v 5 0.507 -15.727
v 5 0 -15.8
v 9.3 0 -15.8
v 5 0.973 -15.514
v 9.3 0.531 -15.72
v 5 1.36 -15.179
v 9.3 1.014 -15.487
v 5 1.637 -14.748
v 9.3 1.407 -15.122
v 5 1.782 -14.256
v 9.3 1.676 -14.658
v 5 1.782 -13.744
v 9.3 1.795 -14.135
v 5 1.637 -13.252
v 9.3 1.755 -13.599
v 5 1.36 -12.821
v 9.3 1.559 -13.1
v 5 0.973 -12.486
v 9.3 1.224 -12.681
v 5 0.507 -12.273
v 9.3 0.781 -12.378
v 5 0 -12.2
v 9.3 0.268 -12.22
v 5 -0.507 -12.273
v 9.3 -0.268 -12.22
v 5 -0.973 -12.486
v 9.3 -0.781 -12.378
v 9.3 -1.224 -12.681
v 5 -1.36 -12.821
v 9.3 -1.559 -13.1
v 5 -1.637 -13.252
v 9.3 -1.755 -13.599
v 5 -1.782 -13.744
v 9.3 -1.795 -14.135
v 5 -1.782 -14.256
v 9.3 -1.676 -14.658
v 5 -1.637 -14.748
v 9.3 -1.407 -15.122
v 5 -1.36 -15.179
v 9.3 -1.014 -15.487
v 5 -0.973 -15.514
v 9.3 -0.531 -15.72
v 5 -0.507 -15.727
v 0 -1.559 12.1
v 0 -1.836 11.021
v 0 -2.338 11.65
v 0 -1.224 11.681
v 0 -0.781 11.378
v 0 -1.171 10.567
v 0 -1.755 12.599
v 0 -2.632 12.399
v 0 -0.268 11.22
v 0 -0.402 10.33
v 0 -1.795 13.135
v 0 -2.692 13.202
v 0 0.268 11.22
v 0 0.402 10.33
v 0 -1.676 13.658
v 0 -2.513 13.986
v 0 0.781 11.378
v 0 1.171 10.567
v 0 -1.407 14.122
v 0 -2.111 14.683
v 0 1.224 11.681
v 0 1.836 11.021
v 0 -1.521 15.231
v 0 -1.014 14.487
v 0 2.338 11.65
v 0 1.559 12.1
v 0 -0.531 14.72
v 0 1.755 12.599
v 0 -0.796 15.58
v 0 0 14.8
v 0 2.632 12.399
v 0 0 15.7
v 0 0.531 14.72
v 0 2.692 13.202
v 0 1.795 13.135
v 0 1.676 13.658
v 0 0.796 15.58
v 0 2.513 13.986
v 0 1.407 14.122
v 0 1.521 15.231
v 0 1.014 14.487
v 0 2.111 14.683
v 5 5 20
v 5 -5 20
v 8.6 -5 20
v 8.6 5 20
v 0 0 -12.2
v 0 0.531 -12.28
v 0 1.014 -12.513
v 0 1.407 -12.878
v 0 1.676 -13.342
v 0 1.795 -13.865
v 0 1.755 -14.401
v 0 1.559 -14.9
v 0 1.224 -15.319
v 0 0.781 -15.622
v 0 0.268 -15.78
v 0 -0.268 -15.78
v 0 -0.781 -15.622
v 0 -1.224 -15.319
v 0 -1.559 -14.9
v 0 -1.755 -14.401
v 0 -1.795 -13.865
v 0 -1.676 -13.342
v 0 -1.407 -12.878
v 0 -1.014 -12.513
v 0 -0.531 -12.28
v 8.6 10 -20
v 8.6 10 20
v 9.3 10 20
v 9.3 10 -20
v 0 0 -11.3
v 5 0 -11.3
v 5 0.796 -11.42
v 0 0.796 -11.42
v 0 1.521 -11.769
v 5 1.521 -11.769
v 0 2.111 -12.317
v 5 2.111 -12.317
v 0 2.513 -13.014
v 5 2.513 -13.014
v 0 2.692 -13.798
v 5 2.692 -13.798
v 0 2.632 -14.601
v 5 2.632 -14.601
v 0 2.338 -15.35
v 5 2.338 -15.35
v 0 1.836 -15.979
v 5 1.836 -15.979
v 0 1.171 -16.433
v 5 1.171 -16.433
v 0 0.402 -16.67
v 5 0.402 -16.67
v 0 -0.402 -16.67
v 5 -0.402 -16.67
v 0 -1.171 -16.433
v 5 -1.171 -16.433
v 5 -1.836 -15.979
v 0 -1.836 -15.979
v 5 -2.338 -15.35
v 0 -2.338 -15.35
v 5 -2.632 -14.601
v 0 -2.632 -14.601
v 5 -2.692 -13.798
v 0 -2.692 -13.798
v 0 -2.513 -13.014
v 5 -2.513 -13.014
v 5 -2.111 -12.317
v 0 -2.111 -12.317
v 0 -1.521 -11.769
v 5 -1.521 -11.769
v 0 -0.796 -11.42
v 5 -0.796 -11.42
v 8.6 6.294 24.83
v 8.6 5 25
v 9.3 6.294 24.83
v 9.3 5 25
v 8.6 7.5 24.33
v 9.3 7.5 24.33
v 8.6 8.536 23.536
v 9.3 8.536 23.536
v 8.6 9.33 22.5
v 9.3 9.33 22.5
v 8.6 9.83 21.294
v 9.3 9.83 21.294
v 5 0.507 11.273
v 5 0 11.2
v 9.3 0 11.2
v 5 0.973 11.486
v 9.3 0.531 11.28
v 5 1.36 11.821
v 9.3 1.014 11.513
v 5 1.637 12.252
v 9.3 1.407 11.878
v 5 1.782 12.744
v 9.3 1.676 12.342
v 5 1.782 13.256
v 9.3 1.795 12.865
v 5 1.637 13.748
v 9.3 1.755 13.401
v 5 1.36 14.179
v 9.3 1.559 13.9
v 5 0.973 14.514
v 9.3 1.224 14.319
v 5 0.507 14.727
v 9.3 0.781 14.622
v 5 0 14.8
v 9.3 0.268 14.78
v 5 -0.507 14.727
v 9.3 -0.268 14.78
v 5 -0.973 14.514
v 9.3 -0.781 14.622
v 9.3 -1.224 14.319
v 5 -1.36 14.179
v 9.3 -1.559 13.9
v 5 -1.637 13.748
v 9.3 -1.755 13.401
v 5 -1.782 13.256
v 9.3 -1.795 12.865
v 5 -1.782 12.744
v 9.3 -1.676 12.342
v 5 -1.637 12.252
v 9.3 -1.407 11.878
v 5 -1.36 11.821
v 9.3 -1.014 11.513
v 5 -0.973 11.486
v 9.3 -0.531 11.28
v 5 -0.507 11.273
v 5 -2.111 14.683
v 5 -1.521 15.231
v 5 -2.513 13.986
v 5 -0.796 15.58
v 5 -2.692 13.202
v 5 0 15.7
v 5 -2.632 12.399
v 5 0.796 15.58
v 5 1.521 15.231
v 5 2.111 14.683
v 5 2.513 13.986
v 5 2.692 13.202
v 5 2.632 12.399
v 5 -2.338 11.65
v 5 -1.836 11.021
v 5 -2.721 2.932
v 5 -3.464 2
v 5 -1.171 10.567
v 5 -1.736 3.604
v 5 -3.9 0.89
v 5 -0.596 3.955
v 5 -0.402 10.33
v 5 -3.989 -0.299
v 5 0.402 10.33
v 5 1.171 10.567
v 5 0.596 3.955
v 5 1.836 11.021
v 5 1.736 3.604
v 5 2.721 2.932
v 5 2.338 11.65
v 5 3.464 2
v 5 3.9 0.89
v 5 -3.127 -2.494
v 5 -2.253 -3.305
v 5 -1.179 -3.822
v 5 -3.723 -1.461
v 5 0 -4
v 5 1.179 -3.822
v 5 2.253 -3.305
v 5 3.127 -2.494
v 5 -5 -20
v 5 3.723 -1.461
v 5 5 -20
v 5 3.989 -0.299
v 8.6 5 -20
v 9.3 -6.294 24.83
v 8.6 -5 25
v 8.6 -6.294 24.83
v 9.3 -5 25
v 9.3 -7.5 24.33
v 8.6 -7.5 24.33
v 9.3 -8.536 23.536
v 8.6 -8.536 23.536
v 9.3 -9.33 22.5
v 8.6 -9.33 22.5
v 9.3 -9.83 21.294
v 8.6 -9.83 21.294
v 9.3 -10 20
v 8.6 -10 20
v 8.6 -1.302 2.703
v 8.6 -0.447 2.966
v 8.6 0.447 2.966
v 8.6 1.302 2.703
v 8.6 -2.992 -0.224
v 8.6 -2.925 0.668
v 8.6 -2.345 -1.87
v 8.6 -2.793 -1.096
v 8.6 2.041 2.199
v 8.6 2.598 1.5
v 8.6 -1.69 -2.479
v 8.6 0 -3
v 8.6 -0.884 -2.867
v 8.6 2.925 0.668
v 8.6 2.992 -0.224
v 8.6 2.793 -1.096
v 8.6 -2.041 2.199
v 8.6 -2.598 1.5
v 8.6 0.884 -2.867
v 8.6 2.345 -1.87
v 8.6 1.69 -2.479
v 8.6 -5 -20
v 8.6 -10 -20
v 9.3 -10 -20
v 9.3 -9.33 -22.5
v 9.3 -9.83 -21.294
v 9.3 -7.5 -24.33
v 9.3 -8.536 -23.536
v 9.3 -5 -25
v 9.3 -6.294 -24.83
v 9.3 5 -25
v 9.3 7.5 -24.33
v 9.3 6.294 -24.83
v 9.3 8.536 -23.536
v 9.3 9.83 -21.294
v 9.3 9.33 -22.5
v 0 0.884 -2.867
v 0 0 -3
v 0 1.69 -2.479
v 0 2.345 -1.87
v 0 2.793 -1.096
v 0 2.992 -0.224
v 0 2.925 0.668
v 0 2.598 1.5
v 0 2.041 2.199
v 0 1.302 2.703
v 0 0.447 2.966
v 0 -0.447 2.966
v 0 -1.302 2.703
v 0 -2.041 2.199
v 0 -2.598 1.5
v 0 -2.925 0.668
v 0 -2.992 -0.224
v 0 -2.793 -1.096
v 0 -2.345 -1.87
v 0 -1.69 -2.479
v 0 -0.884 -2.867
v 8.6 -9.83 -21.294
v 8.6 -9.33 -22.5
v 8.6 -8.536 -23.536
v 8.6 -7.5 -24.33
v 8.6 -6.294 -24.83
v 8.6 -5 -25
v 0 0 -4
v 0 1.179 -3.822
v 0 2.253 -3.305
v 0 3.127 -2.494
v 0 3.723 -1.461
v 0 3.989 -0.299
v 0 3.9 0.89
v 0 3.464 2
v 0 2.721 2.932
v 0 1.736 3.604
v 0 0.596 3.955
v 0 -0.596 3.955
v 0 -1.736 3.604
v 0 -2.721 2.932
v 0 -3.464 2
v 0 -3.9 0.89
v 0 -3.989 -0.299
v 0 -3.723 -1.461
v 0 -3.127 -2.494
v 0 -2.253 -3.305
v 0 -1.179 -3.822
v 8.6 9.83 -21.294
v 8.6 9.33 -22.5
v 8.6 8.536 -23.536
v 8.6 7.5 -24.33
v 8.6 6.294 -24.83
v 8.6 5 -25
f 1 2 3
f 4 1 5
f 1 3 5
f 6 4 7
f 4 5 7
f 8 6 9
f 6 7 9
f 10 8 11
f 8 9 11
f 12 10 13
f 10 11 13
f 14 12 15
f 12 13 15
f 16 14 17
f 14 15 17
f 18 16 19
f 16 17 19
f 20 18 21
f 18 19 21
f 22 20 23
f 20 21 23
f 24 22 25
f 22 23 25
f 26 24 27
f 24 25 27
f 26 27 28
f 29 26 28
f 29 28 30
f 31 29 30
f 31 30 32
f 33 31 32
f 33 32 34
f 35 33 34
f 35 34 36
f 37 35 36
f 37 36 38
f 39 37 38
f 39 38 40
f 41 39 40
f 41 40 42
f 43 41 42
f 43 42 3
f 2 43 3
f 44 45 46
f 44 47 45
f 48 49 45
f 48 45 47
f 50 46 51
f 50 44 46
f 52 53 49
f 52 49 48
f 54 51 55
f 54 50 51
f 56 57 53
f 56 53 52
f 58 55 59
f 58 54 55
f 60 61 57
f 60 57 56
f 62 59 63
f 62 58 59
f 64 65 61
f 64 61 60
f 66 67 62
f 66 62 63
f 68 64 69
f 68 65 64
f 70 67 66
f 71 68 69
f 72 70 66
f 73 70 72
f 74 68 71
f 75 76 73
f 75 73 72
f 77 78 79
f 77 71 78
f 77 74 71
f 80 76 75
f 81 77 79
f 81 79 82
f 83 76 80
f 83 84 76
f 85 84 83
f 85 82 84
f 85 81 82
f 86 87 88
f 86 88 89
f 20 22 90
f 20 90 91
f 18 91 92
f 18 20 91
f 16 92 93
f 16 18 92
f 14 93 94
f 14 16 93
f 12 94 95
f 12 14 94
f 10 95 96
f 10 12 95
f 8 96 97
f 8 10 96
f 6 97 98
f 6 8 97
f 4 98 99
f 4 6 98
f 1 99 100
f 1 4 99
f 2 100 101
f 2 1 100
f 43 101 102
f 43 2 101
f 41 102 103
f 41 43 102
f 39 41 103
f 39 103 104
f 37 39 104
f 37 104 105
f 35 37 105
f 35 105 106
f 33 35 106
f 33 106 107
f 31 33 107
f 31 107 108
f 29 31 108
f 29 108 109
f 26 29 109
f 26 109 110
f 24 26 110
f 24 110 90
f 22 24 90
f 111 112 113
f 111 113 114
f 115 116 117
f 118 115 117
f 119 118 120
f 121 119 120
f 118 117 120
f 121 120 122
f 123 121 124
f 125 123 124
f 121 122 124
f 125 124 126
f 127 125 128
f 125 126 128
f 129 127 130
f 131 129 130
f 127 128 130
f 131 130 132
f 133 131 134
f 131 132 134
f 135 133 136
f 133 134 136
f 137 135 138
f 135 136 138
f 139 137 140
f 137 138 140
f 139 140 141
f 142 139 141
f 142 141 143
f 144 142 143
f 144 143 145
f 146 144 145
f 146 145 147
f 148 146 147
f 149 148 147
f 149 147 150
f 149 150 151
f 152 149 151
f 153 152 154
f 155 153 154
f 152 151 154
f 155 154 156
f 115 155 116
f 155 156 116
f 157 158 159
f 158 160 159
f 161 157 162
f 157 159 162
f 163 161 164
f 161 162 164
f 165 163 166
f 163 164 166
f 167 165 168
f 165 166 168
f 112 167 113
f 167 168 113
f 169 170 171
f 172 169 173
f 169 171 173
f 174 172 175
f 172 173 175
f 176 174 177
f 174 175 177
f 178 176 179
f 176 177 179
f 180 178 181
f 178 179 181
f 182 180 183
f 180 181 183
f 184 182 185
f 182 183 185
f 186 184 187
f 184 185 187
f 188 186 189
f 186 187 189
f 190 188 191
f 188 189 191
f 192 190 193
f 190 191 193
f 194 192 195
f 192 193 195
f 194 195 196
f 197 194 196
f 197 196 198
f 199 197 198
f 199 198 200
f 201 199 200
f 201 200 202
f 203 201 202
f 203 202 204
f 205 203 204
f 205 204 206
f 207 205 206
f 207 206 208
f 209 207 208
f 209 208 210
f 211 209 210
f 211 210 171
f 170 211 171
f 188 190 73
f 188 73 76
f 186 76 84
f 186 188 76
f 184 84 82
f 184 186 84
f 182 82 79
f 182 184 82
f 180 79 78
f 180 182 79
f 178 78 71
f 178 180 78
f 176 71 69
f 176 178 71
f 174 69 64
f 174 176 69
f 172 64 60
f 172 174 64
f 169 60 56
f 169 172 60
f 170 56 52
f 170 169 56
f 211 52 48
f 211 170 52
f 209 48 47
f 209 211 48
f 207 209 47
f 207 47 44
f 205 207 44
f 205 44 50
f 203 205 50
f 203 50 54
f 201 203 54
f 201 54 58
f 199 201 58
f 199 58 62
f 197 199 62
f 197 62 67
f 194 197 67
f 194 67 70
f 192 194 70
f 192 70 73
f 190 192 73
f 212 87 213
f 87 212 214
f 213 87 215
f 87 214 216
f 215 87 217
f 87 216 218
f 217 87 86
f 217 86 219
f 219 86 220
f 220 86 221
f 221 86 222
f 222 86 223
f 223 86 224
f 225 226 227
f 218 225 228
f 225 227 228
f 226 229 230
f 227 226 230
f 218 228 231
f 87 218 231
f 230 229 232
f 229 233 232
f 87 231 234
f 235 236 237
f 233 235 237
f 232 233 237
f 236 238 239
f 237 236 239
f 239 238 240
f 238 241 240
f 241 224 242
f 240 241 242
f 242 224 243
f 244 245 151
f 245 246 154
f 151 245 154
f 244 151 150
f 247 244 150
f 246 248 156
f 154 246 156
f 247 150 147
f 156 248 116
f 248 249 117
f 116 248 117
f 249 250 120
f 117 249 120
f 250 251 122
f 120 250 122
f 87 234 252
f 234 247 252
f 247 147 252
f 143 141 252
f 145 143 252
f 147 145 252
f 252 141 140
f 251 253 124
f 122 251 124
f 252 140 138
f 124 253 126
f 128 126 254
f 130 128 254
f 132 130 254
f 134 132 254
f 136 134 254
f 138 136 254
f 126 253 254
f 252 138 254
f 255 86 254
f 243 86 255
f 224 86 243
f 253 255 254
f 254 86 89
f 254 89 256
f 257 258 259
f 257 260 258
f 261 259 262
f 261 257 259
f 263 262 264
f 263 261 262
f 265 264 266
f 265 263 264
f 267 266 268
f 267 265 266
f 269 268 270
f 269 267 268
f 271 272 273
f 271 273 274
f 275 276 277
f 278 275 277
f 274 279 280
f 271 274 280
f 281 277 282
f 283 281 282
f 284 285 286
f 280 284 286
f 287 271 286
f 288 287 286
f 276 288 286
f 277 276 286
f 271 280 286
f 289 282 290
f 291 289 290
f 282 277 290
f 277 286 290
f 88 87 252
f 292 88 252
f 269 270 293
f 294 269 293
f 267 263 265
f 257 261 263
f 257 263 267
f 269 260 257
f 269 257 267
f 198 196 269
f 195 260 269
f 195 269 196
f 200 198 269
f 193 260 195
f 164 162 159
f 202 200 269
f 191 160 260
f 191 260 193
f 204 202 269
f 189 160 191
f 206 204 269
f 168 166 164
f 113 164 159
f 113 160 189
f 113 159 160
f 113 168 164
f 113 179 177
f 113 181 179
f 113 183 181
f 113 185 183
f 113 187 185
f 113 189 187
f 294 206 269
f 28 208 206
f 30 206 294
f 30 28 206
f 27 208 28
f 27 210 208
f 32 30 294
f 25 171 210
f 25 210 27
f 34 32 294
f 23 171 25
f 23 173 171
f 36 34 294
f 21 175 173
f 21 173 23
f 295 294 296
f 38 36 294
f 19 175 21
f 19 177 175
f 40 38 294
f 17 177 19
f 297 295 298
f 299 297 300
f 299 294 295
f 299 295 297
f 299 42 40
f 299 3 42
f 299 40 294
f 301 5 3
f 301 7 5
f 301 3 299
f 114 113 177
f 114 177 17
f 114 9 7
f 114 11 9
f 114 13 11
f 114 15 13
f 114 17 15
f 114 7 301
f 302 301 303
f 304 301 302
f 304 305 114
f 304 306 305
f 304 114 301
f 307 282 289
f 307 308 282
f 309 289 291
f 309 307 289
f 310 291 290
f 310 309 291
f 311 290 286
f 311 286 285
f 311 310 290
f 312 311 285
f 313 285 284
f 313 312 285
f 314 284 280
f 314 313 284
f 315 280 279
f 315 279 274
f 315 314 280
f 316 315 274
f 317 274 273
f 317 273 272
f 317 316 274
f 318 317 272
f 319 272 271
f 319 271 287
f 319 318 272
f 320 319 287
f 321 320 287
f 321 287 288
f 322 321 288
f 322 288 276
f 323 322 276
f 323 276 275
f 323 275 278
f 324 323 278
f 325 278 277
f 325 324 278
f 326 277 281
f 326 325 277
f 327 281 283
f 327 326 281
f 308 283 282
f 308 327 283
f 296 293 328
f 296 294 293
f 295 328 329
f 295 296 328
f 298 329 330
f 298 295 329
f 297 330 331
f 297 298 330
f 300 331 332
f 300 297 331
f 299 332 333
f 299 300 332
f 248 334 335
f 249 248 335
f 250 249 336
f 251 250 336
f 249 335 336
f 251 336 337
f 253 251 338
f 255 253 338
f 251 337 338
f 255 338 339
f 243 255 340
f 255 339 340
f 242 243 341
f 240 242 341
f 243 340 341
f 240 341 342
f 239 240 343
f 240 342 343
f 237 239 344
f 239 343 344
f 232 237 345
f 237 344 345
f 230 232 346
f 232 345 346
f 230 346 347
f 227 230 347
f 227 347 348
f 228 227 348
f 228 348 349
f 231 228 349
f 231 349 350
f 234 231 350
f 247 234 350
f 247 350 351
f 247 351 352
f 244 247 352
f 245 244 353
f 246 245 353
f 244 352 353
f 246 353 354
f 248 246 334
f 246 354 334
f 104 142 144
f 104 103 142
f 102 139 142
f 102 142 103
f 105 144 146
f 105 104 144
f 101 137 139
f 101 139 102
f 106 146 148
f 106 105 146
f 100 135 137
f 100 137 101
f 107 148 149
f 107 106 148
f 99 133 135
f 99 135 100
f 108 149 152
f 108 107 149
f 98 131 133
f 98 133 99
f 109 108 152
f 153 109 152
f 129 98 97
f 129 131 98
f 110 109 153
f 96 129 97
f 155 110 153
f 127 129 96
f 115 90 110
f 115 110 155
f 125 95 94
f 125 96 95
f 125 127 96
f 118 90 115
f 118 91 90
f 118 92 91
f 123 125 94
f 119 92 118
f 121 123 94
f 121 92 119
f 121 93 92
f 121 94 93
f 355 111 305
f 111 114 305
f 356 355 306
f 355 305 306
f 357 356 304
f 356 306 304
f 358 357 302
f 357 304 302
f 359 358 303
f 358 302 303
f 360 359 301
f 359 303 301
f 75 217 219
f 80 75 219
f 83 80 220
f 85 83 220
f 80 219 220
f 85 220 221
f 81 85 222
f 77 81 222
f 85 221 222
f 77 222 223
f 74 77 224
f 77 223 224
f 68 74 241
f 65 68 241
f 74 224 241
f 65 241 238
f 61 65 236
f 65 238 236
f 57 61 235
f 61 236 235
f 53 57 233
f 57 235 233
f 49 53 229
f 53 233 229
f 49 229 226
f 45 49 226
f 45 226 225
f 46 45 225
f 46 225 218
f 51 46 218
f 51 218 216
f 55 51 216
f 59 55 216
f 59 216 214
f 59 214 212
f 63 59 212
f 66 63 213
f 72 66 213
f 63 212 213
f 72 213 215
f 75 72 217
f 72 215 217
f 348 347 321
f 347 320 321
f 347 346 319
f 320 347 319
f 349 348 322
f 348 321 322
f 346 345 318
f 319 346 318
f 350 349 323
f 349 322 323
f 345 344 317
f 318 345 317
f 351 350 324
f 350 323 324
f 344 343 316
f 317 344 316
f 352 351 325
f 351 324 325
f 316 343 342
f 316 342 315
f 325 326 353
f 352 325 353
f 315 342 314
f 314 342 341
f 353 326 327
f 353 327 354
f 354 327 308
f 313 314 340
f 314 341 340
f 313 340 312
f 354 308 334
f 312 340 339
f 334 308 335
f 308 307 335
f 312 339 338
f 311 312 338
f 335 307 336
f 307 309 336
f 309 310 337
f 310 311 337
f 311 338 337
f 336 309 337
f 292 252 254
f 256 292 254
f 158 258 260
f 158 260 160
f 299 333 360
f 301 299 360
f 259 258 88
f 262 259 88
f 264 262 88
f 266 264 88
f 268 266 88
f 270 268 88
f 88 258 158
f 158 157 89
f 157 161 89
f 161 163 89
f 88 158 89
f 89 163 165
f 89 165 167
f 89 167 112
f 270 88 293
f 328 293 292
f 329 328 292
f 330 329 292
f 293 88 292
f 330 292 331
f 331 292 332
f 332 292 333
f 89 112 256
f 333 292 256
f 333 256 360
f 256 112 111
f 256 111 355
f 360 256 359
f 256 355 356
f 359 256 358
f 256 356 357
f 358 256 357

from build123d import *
from build123d.topology import SkipClean

# Parameters (mm, degrees)
SKETCH1_R                = 4
SKETCH1_R_2              = 3
BOSS_EXTRUDE1_DEPTH      = 5
SKETCH2_W                = 40
SKETCH2_H                = 10
SKETCH2_R                = 3
BOSS_EXTRUDE2_DEPTH      = 3.6
SKETCH7_W                = 50
SKETCH7_H                = 20
BOSS_EXTRUDE3_DEPTH      = 0.7
M3_CLEARANCE_HOLE1_D     = 3.6
M3_CLEARANCE_HOLE1_DEPTH = 12
M3_CLEARANCE_HOLE1_TIP   = 1.081549114
SKETCH8_R                = 2.7
SKETCH8_R_2              = 1.8
BOSS_EXTRUDE4_DEPTH      = 5
FILLET2_R                = 5


with BuildPart() as part:
    # Sketch1 → Boss-Extrude1 (new body)
    with BuildSketch(Plane(origin=(0, 0, 0), x_dir=(0, 0, -1), z_dir=(1, 0, 0))):
        Circle(SKETCH1_R)
        Circle(SKETCH1_R_2, mode=Mode.SUBTRACT)
    extrude(amount=BOSS_EXTRUDE1_DEPTH)

    # Sketch2 → Boss-Extrude2 (add)
    with BuildSketch(Plane(origin=(5, 0, 0), x_dir=(0, 0, -1), z_dir=(1, 0, 0))):
        Rectangle(SKETCH2_W, SKETCH2_H)
        Circle(SKETCH2_R, mode=Mode.SUBTRACT)
    extrude(amount=BOSS_EXTRUDE2_DEPTH)

    # Sketch7 → Boss-Extrude3 (add)
    with BuildSketch(Plane(origin=(8.6, 0, 0), x_dir=(0, 0, -1), z_dir=(1, 0, 0))):
        Rectangle(SKETCH7_W, SKETCH7_H)
    extrude(amount=BOSS_EXTRUDE3_DEPTH)

    # M3 Clearance Hole1
    with Locations(Plane.ZY.offset(-5)):
        with Locations((-14, 0), (13, 0)):
            Hole(M3_CLEARANCE_HOLE1_D / 2, depth=M3_CLEARANCE_HOLE1_DEPTH)
            with Locations((0, 0, -(M3_CLEARANCE_HOLE1_DEPTH + M3_CLEARANCE_HOLE1_TIP / 2))):  # 118° drill point
                Cone(0, M3_CLEARANCE_HOLE1_D / 2, M3_CLEARANCE_HOLE1_TIP, mode=Mode.SUBTRACT)

    # Sketch8 → Boss-Extrude4 (add)
    # profile 1 of 2: a face of its own
    with SkipClean():  # the faces are left unmerged after this step: merging them gives an invalid solid
        with BuildSketch(Plane.ZY.offset(-5)):
            with Locations((-14, 0)):
                Circle(SKETCH8_R)
            with Locations((-14, 0)):
                Circle(SKETCH8_R_2, mode=Mode.SUBTRACT)
        # profile 2 of 2: a face of its own
        with BuildSketch(Plane.ZY.offset(-5)):
            with Locations((13, 0)):
                Circle(SKETCH8_R)
            with Locations((13, 0)):
                Circle(SKETCH8_R_2, mode=Mode.SUBTRACT)
        extrude(amount=BOSS_EXTRUDE4_DEPTH)
    add(part.part.scale(1), mode=Mode.REPLACE)  # the faces are merged on a copy

    # Fillet2
    fillet2_edges = [part.edges().sort_by_distance(p)[0] for p in [
        (8.95, 10, 25),
        (8.95, -10, 25),
        (8.95, -10, -25),
        (8.95, 10, -25),
    ]]
    fillet(fillet2_edges, radius=FILLET2_R)


solid = part.part
